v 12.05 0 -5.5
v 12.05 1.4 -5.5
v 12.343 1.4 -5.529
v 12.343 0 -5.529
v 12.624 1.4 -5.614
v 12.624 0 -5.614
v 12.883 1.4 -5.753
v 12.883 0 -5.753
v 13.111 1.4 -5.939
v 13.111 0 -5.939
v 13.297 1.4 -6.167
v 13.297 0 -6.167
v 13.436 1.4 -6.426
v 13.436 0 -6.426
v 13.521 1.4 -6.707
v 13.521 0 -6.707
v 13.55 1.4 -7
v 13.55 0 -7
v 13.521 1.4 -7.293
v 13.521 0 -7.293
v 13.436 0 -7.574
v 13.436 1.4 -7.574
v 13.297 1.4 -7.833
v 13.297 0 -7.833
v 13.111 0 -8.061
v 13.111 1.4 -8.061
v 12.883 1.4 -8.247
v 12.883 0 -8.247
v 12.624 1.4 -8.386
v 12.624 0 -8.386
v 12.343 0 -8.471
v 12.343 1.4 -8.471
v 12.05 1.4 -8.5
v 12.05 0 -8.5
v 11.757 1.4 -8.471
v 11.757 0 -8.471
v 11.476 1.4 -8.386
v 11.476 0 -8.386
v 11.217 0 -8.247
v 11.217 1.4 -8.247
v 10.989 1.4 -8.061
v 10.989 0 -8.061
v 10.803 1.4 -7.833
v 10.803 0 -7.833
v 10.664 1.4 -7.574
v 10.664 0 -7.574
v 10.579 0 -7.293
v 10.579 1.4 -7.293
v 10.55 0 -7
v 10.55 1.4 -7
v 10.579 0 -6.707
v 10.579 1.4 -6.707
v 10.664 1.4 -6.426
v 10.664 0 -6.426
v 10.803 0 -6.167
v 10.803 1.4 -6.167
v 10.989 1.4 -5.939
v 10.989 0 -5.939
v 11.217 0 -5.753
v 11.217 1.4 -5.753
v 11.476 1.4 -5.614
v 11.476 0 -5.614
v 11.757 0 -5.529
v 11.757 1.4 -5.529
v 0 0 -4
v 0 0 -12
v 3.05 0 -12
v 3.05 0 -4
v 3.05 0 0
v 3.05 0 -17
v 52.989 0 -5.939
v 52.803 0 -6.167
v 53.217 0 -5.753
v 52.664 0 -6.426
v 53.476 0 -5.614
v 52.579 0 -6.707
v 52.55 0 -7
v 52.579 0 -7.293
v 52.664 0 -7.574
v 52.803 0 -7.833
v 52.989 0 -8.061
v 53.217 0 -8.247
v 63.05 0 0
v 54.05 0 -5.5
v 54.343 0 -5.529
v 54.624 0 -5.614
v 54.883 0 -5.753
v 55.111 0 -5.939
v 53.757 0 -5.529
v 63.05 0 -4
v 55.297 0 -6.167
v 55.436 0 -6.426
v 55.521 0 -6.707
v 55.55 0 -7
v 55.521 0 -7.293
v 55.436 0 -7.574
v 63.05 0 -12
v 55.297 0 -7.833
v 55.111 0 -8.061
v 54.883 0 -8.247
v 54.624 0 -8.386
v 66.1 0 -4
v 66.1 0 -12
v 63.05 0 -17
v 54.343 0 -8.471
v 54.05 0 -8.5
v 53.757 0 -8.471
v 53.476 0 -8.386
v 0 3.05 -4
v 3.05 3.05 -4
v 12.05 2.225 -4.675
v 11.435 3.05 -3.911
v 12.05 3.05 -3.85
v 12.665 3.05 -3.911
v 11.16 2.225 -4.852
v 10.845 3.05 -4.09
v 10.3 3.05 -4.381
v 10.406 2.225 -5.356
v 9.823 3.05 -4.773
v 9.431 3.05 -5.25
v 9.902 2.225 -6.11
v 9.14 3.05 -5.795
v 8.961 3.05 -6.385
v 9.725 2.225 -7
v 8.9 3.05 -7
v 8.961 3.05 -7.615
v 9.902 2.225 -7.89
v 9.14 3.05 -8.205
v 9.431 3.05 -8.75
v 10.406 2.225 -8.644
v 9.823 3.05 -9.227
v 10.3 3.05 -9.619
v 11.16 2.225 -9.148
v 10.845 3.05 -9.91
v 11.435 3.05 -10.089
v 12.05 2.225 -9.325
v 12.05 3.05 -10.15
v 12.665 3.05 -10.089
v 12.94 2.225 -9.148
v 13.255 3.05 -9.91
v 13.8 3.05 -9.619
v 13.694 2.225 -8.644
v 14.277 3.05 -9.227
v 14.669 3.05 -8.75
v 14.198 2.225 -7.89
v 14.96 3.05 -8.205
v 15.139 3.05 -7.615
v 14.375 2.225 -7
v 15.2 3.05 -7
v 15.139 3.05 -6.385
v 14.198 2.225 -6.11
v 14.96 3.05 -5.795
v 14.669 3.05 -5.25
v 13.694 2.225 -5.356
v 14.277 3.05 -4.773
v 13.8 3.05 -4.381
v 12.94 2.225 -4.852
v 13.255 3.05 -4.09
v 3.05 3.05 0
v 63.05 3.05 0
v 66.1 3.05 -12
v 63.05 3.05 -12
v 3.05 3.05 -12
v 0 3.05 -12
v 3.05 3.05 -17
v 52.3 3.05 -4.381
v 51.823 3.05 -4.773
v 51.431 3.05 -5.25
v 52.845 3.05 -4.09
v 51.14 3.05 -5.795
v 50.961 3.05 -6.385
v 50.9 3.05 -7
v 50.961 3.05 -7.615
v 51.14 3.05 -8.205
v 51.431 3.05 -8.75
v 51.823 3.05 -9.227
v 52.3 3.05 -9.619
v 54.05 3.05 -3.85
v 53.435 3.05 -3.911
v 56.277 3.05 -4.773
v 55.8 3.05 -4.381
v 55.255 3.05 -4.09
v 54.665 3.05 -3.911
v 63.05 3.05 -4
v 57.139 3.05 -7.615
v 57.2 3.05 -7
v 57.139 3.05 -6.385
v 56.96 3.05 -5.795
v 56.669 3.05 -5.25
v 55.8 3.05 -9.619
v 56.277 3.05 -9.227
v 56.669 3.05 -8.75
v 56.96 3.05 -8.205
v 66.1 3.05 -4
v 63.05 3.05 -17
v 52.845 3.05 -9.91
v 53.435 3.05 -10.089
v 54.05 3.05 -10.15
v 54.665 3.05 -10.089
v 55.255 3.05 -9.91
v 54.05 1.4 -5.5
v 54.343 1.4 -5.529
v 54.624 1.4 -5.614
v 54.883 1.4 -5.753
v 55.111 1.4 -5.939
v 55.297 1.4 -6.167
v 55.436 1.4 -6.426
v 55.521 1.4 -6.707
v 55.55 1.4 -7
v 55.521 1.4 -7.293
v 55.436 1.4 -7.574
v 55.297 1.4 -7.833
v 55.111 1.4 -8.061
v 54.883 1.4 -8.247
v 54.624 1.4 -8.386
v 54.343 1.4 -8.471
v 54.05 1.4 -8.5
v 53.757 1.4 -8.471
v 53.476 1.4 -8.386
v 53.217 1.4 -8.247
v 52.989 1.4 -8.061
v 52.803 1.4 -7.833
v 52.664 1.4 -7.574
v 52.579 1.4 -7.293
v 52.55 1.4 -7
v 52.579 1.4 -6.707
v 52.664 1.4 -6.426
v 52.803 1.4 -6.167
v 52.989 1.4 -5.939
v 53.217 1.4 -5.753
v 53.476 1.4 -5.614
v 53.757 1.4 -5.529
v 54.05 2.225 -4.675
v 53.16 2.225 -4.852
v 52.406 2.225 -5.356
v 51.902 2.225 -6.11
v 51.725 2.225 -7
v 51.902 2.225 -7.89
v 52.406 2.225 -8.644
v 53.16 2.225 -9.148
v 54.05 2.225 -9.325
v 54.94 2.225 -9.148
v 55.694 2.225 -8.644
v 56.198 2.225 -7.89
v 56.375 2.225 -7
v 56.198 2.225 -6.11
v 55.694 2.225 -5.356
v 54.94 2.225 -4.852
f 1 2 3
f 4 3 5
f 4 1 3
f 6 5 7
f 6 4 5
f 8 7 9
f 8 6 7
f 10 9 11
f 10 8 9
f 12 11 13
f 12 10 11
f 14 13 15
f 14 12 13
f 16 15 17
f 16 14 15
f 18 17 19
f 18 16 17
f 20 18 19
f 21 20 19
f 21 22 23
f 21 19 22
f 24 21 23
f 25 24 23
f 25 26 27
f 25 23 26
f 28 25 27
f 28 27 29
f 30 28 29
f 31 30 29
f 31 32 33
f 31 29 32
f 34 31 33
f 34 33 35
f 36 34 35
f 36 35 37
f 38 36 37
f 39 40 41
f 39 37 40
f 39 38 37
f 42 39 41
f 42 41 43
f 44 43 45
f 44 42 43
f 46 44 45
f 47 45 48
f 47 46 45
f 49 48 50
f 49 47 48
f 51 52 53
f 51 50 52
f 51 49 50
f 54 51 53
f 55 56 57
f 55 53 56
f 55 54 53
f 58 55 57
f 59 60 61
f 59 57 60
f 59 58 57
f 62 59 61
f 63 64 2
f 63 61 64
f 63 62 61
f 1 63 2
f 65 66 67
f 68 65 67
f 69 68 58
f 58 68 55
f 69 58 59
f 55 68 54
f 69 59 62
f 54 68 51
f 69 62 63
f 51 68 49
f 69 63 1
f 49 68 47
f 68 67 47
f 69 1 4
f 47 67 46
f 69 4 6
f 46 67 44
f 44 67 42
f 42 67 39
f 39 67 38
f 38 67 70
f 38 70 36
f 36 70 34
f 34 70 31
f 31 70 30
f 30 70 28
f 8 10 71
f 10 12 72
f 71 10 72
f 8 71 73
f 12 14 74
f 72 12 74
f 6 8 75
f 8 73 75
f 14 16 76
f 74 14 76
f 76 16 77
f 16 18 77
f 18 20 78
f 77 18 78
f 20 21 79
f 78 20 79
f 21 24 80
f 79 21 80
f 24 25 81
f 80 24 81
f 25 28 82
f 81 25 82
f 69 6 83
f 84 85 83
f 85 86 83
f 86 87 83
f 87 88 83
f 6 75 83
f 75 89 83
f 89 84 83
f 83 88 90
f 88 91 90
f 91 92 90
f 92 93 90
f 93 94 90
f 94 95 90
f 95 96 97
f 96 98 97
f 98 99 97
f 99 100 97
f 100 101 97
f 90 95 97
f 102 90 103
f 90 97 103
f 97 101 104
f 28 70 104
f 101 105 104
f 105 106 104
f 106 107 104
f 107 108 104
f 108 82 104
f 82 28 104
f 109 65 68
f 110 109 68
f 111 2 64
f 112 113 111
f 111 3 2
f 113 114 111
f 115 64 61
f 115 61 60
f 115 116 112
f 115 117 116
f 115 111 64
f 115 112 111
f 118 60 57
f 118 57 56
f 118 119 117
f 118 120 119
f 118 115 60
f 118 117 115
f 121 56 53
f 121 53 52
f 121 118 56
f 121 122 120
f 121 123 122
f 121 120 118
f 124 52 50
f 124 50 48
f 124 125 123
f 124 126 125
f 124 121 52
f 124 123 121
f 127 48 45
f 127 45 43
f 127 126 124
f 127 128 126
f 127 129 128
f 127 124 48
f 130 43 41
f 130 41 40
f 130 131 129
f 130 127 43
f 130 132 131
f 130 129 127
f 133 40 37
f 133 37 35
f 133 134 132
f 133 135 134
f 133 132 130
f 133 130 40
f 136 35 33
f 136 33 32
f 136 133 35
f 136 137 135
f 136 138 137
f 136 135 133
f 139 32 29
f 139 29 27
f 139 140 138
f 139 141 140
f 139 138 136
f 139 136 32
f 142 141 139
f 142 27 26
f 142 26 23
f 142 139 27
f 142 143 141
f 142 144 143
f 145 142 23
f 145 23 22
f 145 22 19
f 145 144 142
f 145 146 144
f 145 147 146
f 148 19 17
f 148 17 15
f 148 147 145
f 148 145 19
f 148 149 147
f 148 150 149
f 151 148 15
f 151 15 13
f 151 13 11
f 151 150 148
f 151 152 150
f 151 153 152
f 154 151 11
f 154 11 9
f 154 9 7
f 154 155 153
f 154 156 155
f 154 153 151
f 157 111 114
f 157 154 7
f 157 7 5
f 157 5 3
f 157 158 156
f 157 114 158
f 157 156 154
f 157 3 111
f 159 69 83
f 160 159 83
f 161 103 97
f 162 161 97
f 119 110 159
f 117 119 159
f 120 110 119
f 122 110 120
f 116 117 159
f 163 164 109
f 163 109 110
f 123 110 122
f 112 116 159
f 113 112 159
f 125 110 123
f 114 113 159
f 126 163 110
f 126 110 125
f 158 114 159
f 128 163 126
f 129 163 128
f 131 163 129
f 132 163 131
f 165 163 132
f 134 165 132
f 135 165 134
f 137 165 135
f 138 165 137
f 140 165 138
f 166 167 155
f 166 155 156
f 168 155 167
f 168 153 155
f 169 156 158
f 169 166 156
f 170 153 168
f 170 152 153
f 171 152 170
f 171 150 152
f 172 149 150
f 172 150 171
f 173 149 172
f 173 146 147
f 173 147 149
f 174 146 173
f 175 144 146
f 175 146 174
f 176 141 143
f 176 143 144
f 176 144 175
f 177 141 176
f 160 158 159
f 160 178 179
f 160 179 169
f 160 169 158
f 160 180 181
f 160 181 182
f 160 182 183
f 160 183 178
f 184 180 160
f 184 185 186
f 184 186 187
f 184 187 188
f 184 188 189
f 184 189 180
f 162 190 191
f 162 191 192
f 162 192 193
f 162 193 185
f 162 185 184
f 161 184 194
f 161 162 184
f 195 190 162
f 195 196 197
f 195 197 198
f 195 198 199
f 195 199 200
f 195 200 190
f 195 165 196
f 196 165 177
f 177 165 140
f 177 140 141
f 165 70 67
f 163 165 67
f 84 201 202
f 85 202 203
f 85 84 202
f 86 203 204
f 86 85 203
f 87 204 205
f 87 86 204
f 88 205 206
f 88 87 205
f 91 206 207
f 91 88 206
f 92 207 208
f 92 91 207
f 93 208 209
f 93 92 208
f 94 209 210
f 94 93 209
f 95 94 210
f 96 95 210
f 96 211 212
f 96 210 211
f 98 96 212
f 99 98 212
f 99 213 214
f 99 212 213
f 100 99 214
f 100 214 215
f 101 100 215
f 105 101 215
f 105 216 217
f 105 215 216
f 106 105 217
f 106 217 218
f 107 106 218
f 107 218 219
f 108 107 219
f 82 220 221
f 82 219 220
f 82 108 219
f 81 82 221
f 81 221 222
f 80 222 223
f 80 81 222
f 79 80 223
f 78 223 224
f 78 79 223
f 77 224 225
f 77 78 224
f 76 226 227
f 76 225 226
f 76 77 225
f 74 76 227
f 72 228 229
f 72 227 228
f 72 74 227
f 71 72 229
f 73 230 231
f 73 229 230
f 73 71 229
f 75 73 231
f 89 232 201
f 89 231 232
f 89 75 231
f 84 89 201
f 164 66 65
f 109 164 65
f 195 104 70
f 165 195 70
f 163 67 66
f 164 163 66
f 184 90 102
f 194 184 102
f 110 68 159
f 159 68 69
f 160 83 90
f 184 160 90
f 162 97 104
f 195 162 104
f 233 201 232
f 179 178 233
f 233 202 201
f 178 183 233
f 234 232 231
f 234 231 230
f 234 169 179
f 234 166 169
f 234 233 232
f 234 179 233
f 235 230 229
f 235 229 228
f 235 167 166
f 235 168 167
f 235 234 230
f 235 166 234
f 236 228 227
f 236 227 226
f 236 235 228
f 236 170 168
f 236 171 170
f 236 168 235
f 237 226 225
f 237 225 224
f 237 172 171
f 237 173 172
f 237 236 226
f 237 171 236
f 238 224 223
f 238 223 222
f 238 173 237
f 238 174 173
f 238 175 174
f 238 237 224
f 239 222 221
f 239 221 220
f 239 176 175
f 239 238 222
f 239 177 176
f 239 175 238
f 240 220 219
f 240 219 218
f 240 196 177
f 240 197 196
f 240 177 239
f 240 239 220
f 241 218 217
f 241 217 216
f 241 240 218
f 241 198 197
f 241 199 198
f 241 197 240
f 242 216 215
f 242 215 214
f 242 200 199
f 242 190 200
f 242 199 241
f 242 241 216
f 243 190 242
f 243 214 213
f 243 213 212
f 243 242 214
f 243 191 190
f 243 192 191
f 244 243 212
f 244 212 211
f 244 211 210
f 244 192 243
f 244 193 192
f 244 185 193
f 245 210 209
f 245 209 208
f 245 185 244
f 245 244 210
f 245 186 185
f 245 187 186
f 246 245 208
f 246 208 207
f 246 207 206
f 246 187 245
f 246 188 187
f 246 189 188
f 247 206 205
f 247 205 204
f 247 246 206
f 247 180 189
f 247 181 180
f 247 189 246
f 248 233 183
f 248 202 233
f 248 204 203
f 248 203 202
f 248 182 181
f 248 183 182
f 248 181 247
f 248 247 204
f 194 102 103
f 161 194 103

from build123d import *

# Parameters (mm, degrees)
SKETCH1_R           = 1.5
BOSS_EXTRUDE1_DEPTH = 3.05


with BuildPart() as part:
    # Sketch1 → Boss-Extrude1 (new body)
    with BuildSketch(Plane(origin=(0, 0, 0), x_dir=(1, 0, 0), z_dir=(0, 1, 0))):
        Polygon((3.05, 17), (3.05, 12), (0, 12), (0, 4), (3.05, 4), (3.05, 0), (63.05, 0), (63.05, 4), (66.1, 4), (66.1, 12), (63.05, 12), (63.05, 17), align=None)
        with Locations(Location((54.05, 7, 0), (0, 0, 270))):
            Circle(SKETCH1_R, mode=Mode.SUBTRACT)
        with Locations(Location((12.05, 7, 0), (0, 0, 270))):
            Circle(SKETCH1_R, mode=Mode.SUBTRACT)
    extrude(amount=BOSS_EXTRUDE1_DEPTH)

    # Sketch5 → CSK for M3 Flat Head Machine Screw1 (revolve, cut)
    with BuildSketch(Plane(origin=(12.05, 3.05, -7), x_dir=(0, 0, 1), z_dir=(1, 0, 0))):
        Polygon((0, 0), (0, 3.05), (1.5, 3.05), (1.5, 1.65), (3.15, 0), align=None)
    revolve(axis=Axis((12.05, 9.4, -7), (0, -1, 0)), mode=Mode.SUBTRACT)

    # Sketch7 → CSK for M3 Flat Head Machine Screw2 (revolve, cut)
    with BuildSketch(Plane(origin=(54.05, 3.05, -7), x_dir=(0, 0, 1), z_dir=(1, 0, 0))):
        Polygon((0, 0), (0, 3.05), (1.5, 3.05), (1.5, 1.65), (3.15, 0), align=None)
    revolve(axis=Axis((54.05, 9.4, -7), (0, -1, 0)), mode=Mode.SUBTRACT)


solid = part.part
